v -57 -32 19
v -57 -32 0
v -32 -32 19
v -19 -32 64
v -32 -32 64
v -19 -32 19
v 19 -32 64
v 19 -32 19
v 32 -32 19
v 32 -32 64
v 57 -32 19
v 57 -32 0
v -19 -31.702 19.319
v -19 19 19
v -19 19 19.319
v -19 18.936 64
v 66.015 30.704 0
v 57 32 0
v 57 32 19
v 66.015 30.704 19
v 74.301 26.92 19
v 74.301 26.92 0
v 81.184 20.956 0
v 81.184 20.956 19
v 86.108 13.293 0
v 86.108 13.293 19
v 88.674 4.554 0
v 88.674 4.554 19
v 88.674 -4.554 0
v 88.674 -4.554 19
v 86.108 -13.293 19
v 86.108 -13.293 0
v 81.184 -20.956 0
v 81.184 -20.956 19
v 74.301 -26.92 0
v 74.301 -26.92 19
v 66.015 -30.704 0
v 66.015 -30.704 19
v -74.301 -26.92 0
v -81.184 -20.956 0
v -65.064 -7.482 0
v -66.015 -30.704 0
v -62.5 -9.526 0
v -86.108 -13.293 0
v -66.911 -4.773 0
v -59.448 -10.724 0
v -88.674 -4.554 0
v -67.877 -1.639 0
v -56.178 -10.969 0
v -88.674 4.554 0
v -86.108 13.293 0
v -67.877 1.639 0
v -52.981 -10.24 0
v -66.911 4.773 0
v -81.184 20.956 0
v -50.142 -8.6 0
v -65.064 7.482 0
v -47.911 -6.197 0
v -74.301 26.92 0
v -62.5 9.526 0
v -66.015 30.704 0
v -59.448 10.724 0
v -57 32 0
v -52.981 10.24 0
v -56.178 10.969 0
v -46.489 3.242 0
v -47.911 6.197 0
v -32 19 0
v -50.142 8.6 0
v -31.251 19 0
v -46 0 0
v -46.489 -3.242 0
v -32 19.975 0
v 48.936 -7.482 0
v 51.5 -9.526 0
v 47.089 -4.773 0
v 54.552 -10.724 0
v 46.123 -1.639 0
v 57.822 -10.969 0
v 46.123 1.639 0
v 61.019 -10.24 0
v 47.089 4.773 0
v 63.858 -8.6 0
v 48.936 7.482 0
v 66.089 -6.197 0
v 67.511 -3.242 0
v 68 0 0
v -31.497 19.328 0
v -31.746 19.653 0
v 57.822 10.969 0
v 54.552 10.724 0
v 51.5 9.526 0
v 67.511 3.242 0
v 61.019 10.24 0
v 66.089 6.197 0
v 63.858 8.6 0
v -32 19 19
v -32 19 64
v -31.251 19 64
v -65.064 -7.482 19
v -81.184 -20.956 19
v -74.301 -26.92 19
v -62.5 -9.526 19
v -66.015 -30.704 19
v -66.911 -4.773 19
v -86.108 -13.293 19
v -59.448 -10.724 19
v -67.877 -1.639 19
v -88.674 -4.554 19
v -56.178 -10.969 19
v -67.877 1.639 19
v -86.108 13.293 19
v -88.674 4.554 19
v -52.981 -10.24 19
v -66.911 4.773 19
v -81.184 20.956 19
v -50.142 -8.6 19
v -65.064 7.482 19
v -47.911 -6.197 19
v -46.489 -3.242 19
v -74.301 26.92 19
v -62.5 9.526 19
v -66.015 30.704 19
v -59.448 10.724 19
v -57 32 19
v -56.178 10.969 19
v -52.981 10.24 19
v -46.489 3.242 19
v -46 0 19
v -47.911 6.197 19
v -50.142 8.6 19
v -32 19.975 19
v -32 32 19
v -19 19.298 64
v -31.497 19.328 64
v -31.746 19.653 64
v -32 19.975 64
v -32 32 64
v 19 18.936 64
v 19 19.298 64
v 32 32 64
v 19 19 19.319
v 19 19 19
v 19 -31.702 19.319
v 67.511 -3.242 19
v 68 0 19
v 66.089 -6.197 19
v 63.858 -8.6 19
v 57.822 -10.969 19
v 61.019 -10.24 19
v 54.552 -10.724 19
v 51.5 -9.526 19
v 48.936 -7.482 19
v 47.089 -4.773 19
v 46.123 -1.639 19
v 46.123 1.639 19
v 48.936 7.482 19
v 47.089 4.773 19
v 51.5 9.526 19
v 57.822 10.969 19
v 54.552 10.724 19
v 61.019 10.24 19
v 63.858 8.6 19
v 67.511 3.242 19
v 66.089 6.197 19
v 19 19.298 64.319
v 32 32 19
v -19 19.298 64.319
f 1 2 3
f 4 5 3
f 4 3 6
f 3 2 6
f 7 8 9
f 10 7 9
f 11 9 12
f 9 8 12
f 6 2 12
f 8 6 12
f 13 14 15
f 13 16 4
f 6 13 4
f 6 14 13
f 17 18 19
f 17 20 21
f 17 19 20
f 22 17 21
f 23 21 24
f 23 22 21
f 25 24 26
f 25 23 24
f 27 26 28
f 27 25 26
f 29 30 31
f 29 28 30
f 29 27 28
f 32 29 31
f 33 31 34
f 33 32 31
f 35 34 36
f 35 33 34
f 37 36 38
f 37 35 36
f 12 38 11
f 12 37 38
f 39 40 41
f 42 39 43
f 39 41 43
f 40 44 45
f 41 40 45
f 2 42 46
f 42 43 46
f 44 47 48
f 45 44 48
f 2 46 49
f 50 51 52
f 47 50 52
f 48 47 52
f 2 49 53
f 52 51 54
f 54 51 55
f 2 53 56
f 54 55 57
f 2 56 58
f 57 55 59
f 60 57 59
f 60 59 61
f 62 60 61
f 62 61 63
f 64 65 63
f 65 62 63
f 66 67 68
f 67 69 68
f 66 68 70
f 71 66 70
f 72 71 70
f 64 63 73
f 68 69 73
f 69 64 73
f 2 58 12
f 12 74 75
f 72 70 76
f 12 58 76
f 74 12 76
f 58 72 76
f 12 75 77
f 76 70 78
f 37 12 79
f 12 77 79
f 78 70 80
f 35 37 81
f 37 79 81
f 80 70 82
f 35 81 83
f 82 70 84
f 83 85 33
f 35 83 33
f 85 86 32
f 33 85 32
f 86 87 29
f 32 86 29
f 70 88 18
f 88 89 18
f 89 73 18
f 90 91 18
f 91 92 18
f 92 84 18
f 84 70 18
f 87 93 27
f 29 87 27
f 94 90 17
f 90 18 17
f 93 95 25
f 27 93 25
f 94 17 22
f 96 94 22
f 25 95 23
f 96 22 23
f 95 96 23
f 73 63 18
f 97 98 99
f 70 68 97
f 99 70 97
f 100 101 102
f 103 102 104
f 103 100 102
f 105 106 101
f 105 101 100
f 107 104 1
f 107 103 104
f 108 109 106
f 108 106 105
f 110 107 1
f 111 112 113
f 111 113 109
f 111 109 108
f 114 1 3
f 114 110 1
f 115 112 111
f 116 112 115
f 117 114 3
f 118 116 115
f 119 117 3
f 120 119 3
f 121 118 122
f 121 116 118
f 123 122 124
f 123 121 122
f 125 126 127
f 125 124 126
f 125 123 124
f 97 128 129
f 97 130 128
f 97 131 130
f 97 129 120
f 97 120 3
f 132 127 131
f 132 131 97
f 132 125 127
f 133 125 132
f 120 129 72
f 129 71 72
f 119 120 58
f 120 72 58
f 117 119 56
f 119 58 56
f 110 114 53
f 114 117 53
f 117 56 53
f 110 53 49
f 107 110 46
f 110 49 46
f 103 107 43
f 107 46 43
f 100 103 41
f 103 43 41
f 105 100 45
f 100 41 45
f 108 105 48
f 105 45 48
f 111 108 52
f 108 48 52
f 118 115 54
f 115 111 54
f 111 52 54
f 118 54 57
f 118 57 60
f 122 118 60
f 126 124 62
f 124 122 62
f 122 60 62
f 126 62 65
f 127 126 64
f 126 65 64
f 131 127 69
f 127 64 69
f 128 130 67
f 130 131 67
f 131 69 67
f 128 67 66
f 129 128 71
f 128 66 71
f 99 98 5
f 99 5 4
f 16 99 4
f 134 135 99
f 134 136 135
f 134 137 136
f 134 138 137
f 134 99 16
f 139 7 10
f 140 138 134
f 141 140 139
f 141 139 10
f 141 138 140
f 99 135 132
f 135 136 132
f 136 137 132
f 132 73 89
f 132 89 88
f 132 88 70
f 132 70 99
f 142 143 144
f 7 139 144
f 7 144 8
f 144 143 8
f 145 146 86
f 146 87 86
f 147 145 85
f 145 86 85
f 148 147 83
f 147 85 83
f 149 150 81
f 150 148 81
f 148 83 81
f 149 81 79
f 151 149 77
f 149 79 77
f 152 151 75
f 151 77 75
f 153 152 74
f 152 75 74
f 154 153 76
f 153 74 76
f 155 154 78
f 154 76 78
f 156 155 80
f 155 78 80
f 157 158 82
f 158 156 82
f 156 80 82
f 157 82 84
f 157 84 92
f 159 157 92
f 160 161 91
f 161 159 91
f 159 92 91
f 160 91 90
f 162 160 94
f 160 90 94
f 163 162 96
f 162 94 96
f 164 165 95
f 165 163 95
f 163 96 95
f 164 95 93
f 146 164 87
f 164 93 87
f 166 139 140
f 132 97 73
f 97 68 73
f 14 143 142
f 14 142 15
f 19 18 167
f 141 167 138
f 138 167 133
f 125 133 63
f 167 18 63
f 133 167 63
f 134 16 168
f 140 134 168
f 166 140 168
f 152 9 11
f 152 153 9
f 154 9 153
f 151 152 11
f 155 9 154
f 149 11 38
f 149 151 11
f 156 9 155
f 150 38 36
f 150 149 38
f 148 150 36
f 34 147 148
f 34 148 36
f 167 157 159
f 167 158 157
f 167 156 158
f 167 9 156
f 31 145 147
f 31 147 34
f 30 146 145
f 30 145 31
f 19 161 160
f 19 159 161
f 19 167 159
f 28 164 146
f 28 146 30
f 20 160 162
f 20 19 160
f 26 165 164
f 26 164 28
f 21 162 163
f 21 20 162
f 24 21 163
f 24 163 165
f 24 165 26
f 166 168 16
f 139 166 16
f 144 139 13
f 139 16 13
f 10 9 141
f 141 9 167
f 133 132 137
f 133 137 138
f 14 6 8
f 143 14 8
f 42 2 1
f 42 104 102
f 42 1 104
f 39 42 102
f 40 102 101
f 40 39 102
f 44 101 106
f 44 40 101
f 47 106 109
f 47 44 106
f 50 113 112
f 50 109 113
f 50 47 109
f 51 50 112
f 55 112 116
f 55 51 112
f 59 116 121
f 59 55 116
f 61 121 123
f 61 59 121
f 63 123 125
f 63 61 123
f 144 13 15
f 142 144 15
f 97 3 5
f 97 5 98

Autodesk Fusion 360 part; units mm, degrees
sketch "Sketch1" plane through (0, 0, 0) normal (0, 0, 1) x (1, 0, 0)
  line L0 (57, 32) -> (-57, 32)
  line L1 (-57, -32) -> (57, -32)
  circle A0 centre (57, 0) radius 11
  circle A1 centre (-57, 0) radius 11
  line L2 (-32, 32) -> (32, 32)
  line L3 (32, 32) -> (32, 19)
  line L4 (-32, 19) -> (-32, 32)
  arc A2 (-31.2512, 19) -> (-32, 19.975) centre (-57, 0) ccw
  arc A3 (-57, 32) -> (-57, -32) centre (-57, 0) ccw
  arc A4 (57, -32) -> (57, 32) centre (57, 0) ccw
  line L5 (-32, 19) -> (-31.2512, 19)
  line L6 (-19, 19) -> (-19, -32)
  line L7 (-19, -32) -> (-32, -32)
  line L8 (-32, -32) -> (-32, 19)
  line L9 (32, 19) -> (31.2512, 19)
  line L10 (19, 19) -> (19, -32)
  line L11 (19, -32) -> (32, -32)
  line L12 (32, -32) -> (32, 19)
  line L13 (-32, 17.9649) -> (-29.6806, 16.6628) construction
  line L14 (-31.2512, 19) -> (-32, 19)
  line L15 (32, 19) -> (31.2512, 19)
  line L16 (19, 19) -> (-19, 19)
  dimension "d1" = 114
  dimension "d2" = 64
  dimension "d3" = 22
  dimension "d4" = 22
  dimension "d5" = 64
  dimension "d6" = 13
  dimension "d8" = 13
  dimension "d9" = 13
extrude "Extrude1" add sketch "Sketch1" along normal blind 19 contours L0 L1 L3 A4 L12 makes body 1
extrude "Extrude2" add sketch "Sketch1" along normal blind 19 separate body contours L0 L1 L4 A3 L8 makes body 2
extrude "Extrude3" add sketch "Sketch1" along normal blind 19 separate body contours L1 L6 L10 L16 makes body 3
sketch "Sketch2" plane through (0, 0, 0) normal (1, 0, 0) x (0, 1, 0)
  line L0 (-31.7021, 19.3192) -> (19.2979, 19.3192)
  line L1 (19.2979, 19.3192) -> (19.2979, 64.3192)
  line L2 (19.2979, 64.3192) -> (-31.7021, 19.3192)
  dimension "d16" = 51
  dimension "d17" = 45
extrude "Extrude4" add sketch "Sketch1" along normal blind 64 contours L0 L1 L2 L3 L4 A2 L5 L6 L7 L8 L10 L11 L12 L14 L16 bodies 1 2 3
extrude "Extrude5" add sketch "Sketch2" along normal mid plane 38 bodies 1
equation "d6 = 64 mm - 51 mm"
equation "d17 = 64 mm - 19 mm"
